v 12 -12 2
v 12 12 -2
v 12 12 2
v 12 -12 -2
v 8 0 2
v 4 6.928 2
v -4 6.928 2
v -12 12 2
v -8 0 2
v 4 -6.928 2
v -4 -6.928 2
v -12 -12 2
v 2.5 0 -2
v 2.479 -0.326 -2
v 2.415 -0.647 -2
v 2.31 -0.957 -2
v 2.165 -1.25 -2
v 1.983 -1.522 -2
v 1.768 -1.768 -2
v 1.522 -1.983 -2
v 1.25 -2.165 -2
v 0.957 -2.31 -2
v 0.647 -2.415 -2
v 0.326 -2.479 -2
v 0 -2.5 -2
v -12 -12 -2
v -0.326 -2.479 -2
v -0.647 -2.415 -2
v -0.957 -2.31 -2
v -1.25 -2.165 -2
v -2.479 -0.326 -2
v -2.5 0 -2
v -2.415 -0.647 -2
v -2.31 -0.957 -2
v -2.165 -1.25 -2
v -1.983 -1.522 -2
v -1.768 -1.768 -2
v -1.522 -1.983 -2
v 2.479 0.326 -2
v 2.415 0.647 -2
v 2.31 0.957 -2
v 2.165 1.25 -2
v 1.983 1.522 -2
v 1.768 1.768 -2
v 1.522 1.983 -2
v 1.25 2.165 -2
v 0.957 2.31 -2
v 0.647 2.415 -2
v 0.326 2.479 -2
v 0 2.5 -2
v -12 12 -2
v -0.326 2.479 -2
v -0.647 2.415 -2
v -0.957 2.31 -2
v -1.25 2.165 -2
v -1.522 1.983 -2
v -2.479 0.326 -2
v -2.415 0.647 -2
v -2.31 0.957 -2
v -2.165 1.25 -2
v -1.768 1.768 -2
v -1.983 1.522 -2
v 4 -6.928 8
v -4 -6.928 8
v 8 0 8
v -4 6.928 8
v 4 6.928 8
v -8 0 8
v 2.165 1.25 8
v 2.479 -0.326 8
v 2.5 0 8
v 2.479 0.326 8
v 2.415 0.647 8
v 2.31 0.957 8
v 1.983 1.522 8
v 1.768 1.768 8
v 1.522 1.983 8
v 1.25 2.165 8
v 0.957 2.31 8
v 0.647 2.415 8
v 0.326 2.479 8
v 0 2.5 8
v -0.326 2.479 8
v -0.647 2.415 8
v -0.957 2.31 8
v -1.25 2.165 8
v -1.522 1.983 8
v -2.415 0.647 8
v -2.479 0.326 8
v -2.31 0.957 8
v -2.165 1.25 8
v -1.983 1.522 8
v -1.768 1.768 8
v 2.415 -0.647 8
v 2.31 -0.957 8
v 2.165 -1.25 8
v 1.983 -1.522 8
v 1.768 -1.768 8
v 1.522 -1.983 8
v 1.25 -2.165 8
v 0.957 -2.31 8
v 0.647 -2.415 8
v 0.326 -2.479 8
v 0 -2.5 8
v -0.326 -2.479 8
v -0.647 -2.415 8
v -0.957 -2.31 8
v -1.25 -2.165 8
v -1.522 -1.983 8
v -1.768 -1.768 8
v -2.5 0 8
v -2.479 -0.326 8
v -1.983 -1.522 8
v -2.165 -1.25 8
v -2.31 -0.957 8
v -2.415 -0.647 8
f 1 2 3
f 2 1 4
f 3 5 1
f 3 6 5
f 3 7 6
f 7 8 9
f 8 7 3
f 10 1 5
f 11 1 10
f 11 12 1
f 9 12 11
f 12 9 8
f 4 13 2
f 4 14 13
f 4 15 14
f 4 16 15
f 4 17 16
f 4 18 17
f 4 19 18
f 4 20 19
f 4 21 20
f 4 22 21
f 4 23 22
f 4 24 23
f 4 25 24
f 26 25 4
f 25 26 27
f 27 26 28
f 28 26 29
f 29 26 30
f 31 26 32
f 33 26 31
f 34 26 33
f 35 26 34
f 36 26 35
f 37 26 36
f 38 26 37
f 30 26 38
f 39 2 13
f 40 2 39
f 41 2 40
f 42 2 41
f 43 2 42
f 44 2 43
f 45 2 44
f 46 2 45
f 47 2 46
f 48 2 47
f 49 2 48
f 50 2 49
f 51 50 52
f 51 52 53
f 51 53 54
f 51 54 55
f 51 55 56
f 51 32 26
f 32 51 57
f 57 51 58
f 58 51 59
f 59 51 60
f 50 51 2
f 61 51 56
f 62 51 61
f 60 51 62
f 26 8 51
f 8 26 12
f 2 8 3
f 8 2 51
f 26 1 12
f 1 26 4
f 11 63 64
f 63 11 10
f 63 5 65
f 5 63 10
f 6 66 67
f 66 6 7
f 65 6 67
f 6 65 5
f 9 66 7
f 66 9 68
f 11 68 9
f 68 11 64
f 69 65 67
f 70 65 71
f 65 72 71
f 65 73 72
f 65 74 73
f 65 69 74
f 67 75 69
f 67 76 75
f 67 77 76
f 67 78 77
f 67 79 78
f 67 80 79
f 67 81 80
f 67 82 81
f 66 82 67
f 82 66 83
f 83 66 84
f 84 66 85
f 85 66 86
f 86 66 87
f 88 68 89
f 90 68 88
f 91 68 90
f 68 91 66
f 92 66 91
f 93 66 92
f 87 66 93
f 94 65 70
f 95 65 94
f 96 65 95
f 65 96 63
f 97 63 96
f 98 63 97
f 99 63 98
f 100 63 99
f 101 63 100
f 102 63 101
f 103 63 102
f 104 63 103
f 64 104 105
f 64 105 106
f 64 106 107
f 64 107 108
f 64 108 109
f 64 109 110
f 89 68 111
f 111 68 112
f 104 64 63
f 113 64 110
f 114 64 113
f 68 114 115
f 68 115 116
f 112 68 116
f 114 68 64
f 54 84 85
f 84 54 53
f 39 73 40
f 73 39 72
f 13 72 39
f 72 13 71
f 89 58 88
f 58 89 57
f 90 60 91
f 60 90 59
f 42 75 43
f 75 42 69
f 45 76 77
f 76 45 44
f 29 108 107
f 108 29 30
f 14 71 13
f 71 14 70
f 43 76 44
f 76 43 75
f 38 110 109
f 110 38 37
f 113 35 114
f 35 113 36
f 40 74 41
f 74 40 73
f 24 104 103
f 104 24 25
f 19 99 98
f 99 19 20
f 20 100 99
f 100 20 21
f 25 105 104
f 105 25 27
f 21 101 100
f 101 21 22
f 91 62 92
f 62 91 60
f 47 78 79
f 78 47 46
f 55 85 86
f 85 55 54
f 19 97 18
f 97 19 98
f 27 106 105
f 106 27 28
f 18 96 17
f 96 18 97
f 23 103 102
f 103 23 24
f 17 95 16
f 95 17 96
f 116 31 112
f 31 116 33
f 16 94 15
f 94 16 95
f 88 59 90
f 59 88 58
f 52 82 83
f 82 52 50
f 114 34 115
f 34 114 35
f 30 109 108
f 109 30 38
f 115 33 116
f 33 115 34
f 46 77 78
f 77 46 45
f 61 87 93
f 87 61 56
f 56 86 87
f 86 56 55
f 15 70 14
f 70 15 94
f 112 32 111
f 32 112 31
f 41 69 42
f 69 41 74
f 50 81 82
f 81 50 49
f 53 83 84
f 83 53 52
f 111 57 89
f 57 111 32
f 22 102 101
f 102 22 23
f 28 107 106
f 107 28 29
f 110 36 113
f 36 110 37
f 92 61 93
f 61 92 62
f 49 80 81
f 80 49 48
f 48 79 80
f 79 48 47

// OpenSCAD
// hex boss on a plate
plate = 24;
difference() {
  union() {
    cube([plate, plate, 4], center = true);
    translate([0, 0, 2]) cylinder(h = 6, r = 8, $fn = 6);
  }
  cylinder(h = 40, d = 5, center = true, $fn = 48);
}
